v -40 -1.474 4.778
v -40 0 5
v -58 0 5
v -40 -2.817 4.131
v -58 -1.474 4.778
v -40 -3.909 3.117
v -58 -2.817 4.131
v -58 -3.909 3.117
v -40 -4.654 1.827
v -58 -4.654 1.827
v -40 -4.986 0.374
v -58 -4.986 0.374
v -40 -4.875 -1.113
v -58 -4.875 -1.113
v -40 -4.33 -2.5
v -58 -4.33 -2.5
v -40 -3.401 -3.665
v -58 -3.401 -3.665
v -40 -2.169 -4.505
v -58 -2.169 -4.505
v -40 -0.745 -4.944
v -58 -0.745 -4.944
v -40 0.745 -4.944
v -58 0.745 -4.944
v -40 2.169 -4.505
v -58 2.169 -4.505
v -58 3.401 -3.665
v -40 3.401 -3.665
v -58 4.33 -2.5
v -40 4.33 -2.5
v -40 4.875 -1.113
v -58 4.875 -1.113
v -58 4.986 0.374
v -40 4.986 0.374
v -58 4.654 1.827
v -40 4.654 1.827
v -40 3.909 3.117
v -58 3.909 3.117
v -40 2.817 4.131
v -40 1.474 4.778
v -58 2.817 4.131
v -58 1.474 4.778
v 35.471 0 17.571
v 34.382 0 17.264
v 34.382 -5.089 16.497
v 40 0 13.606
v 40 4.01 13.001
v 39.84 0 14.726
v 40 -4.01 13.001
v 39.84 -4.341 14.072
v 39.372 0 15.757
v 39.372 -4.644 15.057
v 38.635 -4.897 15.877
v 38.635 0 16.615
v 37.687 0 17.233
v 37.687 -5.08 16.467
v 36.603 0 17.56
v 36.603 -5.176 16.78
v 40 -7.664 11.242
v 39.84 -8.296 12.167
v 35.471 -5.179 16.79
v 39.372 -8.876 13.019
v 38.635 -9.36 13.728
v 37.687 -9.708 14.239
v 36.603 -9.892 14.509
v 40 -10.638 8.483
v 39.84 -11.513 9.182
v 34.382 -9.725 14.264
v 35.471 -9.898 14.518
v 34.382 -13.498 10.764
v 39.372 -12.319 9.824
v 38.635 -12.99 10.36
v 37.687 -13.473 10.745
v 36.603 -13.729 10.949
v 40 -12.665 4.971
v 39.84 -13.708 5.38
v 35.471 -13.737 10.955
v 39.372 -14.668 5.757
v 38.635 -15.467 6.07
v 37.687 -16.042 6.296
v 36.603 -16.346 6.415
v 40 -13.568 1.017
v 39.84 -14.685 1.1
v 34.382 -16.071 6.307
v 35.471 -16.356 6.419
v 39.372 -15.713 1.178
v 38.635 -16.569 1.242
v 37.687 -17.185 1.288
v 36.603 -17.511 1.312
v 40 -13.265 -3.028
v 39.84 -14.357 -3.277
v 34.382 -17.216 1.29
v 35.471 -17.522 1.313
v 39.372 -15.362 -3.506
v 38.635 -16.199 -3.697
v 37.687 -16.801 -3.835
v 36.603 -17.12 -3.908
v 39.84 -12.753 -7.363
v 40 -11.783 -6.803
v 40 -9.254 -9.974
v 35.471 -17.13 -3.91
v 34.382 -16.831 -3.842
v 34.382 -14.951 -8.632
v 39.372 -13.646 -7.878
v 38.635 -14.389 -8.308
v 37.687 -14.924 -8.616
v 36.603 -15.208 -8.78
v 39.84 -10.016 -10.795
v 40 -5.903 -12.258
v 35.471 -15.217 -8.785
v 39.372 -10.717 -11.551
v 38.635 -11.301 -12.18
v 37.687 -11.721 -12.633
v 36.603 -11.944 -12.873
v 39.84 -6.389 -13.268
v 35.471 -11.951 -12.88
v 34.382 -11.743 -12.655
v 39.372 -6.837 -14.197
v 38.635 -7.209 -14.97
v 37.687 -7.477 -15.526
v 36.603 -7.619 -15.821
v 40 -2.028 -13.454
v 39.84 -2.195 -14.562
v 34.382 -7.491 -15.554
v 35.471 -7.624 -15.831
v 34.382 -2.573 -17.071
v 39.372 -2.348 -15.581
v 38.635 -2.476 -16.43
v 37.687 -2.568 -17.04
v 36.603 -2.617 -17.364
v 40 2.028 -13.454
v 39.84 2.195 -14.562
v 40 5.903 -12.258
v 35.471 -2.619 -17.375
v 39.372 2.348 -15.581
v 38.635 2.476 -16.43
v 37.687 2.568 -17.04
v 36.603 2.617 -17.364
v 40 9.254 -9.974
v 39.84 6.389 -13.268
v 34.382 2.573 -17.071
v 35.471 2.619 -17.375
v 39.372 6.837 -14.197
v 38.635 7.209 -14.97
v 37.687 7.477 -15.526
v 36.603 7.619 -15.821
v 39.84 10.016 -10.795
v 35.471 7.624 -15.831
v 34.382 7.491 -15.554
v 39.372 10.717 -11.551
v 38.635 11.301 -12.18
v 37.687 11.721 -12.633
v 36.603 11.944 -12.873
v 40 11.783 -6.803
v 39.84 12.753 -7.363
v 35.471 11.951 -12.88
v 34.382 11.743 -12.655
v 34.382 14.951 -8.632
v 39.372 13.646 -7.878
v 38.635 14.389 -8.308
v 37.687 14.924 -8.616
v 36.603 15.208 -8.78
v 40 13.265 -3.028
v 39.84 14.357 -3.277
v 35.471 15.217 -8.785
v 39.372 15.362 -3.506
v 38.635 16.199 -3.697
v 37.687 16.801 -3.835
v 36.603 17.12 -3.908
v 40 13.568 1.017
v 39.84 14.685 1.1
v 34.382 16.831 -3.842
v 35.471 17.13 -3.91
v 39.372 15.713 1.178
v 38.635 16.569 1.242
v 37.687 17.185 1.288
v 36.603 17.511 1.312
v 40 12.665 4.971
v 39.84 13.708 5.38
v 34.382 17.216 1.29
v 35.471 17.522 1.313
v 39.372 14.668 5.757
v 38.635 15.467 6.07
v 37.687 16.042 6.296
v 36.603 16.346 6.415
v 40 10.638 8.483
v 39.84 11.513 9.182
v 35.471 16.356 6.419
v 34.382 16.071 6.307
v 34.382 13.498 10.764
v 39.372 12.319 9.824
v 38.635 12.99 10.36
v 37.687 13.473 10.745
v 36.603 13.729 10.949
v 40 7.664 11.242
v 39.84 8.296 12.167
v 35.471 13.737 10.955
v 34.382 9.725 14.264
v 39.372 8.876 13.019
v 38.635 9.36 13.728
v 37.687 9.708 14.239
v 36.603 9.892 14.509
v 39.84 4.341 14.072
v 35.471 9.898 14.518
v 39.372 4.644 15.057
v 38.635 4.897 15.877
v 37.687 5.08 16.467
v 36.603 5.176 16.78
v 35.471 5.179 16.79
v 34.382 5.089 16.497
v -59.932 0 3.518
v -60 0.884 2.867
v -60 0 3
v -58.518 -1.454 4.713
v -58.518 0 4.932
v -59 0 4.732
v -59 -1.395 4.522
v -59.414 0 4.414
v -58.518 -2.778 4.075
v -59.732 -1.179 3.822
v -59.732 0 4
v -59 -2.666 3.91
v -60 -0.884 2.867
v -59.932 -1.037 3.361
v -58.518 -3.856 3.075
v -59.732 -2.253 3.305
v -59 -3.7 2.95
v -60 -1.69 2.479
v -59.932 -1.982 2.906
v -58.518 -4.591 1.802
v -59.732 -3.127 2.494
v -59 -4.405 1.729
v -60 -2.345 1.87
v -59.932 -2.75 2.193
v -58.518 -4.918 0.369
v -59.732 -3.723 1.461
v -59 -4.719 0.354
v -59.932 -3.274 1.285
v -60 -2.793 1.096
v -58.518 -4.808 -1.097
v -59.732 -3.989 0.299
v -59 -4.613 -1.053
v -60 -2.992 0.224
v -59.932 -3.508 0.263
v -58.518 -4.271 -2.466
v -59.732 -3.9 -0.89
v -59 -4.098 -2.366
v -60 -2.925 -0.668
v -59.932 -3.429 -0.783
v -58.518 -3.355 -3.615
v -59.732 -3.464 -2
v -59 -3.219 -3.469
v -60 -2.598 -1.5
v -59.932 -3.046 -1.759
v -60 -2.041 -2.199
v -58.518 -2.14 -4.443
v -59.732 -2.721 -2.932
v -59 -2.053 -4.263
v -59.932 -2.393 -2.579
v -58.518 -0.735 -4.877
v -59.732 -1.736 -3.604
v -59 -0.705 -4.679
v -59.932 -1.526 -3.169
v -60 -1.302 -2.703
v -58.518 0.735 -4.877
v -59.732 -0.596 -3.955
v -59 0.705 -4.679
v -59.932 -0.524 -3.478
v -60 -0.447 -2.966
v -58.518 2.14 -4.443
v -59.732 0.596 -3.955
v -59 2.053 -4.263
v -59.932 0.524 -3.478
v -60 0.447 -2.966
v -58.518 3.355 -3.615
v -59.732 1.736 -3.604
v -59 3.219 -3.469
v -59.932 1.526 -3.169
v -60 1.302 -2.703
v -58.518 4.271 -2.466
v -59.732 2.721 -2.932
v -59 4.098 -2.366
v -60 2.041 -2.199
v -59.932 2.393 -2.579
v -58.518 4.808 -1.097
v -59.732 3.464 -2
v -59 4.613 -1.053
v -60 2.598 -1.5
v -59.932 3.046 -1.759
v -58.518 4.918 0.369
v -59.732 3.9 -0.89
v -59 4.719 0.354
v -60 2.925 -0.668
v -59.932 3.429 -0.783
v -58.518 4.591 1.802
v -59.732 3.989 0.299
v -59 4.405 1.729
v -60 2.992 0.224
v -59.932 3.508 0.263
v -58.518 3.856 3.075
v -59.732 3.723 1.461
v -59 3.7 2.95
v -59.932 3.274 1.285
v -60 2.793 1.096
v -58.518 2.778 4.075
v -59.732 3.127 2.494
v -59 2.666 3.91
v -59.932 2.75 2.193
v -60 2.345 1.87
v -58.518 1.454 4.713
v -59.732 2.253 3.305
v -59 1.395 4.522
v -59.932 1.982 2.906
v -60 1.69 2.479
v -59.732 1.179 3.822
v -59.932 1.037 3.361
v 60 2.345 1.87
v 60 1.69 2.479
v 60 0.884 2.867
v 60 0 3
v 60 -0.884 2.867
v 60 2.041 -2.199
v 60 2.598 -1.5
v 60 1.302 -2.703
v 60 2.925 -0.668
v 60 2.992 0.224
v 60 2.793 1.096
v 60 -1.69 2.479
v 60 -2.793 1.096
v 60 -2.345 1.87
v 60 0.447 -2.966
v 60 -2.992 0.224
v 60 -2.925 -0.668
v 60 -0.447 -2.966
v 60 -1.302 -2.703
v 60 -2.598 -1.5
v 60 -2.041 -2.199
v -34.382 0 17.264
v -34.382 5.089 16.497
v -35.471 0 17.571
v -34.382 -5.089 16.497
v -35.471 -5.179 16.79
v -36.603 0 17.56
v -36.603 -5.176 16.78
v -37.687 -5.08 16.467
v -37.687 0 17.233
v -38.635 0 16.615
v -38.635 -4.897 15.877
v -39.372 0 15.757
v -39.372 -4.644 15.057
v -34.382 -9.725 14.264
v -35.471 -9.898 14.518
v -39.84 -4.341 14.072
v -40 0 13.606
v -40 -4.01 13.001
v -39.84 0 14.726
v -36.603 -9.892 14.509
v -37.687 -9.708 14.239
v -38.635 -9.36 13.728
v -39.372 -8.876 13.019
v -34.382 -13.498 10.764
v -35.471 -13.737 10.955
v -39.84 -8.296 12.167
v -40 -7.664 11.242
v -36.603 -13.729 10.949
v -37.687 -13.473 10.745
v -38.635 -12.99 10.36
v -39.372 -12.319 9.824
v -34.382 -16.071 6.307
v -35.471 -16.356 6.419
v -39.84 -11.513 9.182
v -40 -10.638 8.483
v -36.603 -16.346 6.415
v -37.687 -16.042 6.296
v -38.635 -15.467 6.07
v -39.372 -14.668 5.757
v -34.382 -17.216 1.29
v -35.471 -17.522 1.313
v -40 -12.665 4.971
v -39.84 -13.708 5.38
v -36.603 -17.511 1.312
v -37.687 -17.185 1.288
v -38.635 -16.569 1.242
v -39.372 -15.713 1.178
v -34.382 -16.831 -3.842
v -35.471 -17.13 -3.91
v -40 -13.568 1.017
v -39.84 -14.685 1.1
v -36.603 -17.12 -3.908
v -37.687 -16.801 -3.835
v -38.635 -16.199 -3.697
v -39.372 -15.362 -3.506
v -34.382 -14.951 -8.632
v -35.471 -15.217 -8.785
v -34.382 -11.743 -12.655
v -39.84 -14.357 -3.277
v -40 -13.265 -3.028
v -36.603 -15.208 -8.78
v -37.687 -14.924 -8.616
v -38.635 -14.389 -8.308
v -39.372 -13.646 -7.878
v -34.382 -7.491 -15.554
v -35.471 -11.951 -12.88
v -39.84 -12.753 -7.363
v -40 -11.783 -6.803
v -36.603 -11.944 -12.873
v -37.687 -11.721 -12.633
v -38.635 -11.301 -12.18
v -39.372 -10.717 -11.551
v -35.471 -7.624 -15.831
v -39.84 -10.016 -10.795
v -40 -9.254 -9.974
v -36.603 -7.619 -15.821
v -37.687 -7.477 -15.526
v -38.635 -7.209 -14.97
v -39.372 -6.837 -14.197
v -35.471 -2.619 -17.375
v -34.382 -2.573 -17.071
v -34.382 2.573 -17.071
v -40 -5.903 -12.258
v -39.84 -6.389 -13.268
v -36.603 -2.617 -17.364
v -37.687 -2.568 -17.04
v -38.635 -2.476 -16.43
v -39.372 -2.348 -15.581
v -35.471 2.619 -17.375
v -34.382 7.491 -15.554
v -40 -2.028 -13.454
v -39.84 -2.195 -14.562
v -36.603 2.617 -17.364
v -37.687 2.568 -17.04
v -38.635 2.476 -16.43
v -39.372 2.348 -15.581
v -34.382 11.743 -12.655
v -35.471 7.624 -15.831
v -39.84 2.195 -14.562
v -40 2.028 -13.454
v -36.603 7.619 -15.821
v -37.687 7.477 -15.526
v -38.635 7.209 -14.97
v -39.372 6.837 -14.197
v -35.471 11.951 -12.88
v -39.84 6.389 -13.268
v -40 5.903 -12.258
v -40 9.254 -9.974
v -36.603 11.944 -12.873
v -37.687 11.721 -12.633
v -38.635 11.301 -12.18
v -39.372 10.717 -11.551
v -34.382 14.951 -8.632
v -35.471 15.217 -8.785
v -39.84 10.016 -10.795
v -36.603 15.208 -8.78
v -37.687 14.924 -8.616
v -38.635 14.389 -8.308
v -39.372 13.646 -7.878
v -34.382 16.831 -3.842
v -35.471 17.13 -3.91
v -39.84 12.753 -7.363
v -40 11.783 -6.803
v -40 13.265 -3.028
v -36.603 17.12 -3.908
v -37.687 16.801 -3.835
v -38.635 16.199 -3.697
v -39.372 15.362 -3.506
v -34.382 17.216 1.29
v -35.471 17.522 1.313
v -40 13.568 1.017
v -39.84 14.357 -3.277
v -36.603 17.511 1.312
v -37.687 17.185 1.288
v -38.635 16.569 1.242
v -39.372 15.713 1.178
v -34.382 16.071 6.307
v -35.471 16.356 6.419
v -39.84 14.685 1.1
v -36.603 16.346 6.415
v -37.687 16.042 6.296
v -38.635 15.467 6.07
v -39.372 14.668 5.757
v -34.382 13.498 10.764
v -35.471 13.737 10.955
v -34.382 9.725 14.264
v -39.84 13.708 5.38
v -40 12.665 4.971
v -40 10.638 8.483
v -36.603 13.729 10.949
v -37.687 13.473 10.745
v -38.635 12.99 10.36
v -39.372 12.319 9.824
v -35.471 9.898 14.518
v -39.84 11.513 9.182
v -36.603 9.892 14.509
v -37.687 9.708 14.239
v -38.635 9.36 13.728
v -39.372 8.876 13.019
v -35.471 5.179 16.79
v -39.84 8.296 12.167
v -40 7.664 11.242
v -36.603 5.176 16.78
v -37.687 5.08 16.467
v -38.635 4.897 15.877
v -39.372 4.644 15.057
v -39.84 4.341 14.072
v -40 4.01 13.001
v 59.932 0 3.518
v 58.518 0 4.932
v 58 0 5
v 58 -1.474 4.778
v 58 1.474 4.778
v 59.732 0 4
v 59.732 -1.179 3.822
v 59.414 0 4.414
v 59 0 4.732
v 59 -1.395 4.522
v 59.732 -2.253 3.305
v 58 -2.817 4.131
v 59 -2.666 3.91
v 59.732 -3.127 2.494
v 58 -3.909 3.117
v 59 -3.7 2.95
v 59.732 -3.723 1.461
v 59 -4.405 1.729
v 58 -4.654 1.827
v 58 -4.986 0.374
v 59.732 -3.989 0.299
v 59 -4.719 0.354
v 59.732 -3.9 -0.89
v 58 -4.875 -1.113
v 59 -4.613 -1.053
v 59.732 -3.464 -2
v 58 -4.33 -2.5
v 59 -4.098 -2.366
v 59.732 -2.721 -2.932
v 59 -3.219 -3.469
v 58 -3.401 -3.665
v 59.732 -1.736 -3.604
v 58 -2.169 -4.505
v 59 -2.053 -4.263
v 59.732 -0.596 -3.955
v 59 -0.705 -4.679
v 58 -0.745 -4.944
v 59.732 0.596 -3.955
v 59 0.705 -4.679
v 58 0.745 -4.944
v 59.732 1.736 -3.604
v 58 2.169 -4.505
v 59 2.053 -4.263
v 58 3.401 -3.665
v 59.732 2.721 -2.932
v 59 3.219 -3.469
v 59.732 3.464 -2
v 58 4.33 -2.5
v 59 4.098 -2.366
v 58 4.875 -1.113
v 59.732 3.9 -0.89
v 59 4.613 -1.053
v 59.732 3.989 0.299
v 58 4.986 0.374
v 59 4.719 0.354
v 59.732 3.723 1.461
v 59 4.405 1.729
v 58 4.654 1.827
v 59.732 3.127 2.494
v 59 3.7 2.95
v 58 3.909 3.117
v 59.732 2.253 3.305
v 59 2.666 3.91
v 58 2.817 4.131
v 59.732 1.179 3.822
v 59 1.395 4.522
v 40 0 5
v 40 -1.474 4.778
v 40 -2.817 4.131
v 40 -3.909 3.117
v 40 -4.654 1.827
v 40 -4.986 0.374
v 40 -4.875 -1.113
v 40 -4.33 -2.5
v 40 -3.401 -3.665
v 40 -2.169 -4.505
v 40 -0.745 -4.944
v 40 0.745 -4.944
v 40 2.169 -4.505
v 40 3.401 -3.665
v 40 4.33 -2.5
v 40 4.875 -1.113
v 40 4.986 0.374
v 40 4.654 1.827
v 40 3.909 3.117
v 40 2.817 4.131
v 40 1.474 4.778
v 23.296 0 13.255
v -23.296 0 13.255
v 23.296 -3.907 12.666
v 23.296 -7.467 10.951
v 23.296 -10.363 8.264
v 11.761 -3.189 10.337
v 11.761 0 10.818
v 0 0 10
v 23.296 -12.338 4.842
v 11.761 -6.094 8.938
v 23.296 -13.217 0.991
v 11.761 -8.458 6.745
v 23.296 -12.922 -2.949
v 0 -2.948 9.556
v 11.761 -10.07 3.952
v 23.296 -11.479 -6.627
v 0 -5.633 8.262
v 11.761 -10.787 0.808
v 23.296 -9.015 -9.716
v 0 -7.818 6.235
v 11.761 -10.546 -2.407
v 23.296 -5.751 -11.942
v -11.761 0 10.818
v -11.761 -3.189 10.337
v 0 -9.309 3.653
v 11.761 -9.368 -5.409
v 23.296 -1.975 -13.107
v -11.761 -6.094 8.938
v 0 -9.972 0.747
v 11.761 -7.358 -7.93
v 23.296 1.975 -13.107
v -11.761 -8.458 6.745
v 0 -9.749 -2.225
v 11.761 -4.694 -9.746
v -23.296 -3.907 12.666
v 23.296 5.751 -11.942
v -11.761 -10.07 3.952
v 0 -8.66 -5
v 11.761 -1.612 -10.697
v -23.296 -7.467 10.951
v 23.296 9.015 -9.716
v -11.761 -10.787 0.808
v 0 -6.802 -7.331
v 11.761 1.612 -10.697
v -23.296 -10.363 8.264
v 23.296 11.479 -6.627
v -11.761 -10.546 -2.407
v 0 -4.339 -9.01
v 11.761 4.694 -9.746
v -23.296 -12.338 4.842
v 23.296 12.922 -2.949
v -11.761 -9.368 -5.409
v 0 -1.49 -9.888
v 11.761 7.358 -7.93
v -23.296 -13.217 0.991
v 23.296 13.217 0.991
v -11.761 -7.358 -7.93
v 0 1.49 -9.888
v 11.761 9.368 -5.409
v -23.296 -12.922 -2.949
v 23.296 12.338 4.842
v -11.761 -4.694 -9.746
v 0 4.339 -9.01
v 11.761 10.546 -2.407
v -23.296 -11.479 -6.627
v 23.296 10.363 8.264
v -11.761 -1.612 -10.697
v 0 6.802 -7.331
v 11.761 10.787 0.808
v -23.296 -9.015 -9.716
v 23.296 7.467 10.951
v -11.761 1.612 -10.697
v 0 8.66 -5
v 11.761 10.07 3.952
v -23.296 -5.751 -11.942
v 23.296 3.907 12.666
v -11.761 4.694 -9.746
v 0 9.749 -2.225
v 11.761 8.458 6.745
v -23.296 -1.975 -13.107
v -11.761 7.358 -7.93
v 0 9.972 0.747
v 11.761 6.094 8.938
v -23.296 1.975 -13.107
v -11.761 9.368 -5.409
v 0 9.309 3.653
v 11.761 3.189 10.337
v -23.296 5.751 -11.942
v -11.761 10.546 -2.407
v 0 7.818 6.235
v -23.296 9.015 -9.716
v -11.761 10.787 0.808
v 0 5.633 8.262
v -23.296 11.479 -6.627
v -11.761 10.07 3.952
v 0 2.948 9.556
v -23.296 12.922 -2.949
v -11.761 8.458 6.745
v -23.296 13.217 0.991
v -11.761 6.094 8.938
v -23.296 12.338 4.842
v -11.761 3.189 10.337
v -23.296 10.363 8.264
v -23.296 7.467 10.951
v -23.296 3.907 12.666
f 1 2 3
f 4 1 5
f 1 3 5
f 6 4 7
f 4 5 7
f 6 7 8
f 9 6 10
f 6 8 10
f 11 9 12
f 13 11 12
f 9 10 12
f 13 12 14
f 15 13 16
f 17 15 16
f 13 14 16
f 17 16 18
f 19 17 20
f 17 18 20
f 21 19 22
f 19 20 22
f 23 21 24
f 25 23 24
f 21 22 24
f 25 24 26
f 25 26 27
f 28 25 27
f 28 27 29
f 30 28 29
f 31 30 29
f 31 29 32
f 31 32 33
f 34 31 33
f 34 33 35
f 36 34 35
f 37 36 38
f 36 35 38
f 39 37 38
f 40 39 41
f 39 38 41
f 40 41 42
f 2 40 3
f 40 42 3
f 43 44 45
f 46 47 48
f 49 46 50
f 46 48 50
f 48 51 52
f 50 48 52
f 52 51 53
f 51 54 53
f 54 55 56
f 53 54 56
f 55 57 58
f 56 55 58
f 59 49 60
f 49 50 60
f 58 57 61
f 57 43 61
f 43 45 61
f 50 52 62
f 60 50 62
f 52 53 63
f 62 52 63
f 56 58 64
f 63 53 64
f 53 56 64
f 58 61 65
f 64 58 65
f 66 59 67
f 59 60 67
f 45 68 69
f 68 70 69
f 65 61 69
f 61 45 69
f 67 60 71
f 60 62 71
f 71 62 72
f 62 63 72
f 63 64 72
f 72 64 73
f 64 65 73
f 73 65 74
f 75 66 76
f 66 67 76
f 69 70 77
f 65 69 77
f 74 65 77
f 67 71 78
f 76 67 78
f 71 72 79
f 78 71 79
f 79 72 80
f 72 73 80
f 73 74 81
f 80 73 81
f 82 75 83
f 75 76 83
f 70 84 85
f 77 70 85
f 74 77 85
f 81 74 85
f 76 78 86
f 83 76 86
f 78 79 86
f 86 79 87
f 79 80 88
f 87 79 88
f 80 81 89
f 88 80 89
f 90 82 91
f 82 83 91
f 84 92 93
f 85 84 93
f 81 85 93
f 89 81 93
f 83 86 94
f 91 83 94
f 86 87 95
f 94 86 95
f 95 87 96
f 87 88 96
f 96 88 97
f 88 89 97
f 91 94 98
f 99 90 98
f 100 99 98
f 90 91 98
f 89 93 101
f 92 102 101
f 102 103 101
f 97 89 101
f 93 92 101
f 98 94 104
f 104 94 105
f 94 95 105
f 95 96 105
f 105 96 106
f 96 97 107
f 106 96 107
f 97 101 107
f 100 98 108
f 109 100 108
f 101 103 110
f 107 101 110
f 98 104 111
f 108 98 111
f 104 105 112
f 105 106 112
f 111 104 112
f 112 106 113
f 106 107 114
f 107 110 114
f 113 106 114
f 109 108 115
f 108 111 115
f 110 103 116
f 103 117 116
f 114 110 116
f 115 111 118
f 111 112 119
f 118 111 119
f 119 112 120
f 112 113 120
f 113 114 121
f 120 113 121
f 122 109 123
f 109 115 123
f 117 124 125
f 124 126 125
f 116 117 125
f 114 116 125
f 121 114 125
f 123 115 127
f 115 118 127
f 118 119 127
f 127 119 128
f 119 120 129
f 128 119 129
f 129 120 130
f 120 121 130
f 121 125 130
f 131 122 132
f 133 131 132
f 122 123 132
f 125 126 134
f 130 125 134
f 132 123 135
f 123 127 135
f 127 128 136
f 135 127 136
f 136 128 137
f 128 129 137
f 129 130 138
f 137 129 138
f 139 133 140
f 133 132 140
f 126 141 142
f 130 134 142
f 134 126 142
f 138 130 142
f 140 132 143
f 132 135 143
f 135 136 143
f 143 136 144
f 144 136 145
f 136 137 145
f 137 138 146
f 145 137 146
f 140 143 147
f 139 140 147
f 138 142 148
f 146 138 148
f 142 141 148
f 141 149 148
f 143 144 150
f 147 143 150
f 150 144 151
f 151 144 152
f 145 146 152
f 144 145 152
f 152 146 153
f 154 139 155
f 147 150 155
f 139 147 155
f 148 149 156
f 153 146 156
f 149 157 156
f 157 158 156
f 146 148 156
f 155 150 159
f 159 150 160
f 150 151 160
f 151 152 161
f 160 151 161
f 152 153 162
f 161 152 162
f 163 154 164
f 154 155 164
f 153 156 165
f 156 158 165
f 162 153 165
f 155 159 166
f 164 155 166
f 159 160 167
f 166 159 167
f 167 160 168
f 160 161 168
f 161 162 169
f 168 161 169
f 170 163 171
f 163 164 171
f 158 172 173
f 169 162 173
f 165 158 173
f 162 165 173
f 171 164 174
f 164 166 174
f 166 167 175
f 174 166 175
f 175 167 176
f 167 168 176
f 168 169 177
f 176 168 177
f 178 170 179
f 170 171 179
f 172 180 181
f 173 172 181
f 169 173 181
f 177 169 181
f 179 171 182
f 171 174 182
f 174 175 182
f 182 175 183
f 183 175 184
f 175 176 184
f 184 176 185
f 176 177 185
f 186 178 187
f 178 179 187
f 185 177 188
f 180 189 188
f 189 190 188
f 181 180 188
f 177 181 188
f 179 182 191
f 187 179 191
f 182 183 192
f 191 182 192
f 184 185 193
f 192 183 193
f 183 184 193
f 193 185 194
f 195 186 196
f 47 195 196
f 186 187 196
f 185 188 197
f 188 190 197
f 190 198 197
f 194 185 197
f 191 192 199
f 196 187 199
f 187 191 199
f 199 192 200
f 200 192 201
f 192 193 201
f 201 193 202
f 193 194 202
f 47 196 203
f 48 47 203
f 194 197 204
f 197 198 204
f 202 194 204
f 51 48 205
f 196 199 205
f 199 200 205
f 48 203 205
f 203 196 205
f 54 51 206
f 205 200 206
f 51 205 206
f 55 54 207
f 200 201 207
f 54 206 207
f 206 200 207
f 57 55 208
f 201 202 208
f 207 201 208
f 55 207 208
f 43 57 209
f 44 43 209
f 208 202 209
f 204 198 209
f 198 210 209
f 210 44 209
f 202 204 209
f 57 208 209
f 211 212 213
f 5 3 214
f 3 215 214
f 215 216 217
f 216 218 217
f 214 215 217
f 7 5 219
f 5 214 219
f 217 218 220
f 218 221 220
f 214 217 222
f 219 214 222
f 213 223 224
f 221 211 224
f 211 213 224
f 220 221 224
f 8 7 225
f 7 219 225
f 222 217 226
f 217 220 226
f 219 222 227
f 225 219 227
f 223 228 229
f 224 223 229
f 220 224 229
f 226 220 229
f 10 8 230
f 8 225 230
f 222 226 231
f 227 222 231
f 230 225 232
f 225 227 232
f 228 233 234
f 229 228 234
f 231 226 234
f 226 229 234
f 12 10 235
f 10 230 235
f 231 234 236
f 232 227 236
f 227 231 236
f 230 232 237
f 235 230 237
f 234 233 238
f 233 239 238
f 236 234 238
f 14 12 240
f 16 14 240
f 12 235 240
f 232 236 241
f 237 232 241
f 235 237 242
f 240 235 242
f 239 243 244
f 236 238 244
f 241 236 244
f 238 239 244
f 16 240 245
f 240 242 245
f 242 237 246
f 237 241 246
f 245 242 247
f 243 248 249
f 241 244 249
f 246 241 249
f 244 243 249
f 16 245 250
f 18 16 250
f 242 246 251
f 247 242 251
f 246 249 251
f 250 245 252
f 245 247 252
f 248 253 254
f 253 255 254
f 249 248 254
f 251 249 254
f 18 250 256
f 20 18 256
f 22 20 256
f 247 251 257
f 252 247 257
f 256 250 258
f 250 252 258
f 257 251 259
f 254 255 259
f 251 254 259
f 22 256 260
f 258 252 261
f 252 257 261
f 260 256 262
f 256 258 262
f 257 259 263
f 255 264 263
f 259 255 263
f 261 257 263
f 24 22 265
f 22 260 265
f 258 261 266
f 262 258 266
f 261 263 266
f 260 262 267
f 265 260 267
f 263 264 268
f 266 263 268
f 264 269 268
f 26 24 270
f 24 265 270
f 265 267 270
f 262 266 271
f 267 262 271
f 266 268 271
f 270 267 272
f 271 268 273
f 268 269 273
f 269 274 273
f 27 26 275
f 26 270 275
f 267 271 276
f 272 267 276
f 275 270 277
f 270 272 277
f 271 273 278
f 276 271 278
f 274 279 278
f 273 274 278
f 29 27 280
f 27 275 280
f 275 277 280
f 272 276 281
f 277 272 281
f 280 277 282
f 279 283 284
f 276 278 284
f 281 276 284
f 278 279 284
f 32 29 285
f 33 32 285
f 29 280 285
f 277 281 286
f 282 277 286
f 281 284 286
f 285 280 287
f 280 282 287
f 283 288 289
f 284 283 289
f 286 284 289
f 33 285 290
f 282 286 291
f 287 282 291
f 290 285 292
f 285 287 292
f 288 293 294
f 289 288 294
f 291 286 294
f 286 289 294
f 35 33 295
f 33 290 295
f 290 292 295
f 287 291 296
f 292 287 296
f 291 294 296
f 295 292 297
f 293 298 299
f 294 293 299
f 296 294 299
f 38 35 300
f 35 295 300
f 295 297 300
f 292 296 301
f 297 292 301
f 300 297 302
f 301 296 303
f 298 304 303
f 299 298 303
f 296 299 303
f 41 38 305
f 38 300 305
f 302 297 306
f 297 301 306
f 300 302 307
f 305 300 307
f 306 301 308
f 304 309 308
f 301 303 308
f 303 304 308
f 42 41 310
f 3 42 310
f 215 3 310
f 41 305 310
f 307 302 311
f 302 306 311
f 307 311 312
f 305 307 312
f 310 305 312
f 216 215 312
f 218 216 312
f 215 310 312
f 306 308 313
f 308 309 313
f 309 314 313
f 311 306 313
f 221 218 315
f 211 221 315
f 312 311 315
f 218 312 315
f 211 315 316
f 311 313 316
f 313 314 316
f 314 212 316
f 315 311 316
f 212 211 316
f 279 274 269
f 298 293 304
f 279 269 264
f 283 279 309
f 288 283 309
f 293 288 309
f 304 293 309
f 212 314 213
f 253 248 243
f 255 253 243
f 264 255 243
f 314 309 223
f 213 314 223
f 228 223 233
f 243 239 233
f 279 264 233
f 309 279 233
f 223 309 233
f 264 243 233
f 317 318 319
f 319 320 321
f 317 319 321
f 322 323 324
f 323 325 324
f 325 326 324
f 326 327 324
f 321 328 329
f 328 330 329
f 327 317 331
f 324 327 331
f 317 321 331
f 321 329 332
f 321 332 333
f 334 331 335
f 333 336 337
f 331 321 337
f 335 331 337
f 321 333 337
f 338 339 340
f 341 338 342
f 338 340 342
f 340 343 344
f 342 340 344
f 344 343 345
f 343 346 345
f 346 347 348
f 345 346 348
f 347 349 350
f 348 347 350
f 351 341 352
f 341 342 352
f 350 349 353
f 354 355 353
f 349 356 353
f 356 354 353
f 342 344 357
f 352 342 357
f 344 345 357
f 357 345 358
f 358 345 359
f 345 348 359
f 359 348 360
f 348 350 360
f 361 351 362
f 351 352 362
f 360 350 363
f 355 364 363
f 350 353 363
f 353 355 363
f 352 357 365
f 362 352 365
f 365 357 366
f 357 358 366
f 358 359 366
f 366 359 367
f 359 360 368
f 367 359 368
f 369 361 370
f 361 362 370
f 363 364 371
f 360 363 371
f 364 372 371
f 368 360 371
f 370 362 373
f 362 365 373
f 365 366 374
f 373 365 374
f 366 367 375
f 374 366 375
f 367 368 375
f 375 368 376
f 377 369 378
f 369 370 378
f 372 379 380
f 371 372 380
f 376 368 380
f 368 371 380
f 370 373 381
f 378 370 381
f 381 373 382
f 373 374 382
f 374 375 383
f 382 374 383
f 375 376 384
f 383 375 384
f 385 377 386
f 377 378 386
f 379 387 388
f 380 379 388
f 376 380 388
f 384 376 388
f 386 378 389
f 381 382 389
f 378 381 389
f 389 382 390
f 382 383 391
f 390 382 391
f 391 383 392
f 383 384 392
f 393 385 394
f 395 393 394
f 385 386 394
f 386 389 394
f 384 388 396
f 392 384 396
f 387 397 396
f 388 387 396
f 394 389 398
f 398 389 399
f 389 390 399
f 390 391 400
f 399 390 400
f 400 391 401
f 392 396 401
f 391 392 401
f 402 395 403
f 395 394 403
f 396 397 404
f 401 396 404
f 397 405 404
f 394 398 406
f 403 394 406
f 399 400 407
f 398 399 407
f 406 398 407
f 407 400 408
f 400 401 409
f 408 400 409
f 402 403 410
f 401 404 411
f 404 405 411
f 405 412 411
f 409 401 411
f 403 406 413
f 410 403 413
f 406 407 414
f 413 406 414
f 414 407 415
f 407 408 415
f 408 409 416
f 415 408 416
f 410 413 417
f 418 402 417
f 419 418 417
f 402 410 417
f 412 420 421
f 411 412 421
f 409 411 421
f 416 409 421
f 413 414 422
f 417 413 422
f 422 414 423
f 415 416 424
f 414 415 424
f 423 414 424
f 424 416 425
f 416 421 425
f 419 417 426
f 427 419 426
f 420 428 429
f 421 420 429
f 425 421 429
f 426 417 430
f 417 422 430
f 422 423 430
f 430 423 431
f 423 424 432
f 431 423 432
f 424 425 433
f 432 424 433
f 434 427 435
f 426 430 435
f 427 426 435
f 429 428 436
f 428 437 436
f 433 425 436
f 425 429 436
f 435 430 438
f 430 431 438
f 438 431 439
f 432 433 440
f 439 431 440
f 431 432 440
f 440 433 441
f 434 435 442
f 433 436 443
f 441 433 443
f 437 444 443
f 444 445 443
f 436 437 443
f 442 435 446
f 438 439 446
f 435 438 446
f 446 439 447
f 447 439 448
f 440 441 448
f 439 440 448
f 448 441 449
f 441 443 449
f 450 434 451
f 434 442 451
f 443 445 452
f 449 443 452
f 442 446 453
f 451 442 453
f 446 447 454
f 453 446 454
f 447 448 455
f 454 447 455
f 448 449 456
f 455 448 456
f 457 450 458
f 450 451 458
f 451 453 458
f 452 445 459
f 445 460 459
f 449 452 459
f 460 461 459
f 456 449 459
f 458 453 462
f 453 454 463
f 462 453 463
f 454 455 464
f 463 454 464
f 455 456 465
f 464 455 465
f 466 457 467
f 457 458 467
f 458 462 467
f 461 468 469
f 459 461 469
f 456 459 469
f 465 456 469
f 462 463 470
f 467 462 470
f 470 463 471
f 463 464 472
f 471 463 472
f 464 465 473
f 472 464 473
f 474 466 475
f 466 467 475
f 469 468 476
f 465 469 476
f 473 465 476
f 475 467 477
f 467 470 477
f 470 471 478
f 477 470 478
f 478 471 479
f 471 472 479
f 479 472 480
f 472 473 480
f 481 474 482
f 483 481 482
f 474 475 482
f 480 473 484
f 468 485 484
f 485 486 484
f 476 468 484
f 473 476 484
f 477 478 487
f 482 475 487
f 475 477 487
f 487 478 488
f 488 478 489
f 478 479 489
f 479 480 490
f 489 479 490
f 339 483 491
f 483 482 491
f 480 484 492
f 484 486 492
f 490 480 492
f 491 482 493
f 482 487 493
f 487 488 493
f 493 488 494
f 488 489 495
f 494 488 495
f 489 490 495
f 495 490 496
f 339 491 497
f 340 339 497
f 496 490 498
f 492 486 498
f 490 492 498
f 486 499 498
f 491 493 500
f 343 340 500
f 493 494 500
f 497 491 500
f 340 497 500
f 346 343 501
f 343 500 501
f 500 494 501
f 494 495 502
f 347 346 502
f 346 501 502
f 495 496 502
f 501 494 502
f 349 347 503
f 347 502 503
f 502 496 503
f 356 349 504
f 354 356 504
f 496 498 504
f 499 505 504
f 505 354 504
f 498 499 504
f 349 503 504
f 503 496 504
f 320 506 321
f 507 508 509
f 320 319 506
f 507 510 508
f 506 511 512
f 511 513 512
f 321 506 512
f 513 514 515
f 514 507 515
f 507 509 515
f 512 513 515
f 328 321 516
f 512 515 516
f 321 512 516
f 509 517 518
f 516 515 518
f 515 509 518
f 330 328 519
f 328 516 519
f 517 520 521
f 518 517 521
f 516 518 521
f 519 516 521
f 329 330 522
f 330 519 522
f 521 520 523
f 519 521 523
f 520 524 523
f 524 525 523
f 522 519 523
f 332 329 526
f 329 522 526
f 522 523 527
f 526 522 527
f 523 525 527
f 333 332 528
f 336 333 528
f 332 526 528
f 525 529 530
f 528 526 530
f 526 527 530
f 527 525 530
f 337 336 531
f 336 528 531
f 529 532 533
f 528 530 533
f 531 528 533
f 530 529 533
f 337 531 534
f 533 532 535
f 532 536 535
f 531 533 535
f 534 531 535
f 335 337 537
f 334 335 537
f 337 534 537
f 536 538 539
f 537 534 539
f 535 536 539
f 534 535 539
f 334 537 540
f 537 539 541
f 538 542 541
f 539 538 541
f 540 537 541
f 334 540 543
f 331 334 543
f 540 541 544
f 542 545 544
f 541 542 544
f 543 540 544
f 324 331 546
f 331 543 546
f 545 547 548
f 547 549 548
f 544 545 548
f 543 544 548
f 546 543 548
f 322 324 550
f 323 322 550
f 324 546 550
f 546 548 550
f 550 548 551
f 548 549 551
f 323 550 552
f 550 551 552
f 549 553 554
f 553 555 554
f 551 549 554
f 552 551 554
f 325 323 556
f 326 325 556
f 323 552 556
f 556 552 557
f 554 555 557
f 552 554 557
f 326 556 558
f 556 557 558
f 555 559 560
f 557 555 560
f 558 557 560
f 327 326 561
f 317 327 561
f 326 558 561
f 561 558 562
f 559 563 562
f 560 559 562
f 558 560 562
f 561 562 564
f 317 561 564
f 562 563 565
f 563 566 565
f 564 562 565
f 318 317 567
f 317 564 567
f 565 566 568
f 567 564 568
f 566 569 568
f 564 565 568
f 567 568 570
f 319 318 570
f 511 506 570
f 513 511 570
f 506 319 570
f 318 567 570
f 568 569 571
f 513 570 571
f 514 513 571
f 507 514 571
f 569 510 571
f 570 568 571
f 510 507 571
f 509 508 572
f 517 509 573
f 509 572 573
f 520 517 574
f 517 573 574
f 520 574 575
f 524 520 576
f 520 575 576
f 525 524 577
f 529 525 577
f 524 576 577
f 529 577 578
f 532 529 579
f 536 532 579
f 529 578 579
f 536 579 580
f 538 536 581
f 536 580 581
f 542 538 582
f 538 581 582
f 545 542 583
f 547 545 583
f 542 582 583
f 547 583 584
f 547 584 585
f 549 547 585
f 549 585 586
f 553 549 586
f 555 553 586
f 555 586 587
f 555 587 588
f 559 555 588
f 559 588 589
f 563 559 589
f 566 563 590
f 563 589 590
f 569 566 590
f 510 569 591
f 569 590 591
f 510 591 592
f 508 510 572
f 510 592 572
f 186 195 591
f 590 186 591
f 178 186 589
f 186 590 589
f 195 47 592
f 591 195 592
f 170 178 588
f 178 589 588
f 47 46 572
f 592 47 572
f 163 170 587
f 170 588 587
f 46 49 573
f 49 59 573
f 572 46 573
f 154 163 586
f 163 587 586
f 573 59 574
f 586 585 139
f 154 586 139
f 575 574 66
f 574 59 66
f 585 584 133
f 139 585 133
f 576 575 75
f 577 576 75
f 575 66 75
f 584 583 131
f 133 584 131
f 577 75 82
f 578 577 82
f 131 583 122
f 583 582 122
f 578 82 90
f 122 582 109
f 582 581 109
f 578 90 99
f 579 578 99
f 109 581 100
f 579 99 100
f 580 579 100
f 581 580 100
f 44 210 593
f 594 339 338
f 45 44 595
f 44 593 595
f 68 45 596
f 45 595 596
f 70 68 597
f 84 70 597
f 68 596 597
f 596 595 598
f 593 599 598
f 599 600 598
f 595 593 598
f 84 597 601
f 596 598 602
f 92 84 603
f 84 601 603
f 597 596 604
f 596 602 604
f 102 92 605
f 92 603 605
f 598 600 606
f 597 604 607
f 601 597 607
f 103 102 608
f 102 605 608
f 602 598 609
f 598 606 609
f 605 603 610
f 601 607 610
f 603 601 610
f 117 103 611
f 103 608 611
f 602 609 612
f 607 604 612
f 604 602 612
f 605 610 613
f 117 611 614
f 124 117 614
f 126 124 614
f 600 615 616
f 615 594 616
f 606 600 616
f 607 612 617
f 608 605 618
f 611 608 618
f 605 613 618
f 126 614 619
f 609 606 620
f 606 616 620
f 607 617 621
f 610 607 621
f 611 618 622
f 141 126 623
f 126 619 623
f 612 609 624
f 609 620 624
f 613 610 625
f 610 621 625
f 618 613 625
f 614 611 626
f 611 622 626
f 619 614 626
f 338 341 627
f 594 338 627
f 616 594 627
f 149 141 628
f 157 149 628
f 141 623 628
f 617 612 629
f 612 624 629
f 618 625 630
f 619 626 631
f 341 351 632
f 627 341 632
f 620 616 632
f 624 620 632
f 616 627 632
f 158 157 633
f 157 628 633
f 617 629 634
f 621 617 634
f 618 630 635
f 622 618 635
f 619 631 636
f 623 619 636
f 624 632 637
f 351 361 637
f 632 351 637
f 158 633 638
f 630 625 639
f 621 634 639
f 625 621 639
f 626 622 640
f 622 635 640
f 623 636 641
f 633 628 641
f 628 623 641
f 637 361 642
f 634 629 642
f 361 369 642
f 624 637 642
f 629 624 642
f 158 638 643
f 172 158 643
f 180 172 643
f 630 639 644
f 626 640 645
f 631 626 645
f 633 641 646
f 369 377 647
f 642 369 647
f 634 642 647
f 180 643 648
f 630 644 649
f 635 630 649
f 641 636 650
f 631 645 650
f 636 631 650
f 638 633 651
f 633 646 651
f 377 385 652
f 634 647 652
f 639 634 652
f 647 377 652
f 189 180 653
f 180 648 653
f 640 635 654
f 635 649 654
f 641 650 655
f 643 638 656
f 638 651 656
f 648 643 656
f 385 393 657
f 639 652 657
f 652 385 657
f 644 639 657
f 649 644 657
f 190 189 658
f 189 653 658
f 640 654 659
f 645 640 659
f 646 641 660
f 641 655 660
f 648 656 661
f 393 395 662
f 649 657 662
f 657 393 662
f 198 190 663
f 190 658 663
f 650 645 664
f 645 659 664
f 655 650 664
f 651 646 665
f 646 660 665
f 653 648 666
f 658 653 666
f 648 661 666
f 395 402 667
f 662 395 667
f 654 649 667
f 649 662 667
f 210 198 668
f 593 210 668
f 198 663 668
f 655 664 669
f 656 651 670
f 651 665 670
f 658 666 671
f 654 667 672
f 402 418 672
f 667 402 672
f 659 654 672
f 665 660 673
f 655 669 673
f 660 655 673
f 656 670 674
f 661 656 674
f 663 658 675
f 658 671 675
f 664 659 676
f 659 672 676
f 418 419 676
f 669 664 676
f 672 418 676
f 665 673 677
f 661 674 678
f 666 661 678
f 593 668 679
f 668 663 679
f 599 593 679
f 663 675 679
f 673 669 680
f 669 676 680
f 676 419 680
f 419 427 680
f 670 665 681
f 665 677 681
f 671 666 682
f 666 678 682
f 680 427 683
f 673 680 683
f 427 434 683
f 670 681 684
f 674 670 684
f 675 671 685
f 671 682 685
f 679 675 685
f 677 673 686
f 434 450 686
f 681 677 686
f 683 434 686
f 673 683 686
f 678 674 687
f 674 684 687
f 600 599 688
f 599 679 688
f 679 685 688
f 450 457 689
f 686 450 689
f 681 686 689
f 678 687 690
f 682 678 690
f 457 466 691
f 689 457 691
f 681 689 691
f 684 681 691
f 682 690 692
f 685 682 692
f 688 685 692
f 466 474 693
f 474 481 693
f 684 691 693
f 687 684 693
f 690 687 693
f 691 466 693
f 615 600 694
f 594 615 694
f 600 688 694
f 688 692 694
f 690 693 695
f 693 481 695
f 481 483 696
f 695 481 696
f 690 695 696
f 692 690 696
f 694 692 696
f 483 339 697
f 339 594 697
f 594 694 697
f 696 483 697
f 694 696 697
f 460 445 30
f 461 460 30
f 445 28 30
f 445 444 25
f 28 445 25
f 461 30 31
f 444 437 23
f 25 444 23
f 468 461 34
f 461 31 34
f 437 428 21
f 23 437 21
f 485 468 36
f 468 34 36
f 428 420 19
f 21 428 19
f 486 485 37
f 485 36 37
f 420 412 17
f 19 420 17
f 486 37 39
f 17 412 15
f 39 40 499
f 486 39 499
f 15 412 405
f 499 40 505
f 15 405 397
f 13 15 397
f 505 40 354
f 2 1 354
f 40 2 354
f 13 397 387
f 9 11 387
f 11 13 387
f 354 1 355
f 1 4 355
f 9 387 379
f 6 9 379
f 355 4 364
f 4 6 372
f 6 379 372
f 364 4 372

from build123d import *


with BuildPart() as part:
    # Sketch3 → Revolve1 (revolve)
    with BuildSketch(Plane.XY, mode=Mode.PRIVATE) as revolve1_sk:
        with BuildLine():
            Line((-60, 0), (60, 0))
            Line((60, 0), (60, -3))
            ThreePointArc((60, -3), (59.414213562, -4.414213562), (58, -5))
            Line((58, -5), (40, -5))
            Line((40, -5), (40, -13.60589702))
            ThreePointArc((40, -13.60589702), (38.182669225, -16.957904635), (34.382022472, -17.264058951))
            ThreePointArc((34.382022472, -17.264058951), (0, -10), (-34.382022472, -17.264058951))
            ThreePointArc((-34.382022472, -17.264058951), (-38.182669225, -16.957904635), (-40, -13.60589702))
            Line((-40, -13.60589702), (-40, -5))
            Line((-40, -5), (-58, -5))
            ThreePointArc((-58, -5), (-59.414213562, -4.414213562), (-60, -3))
            Line((-60, -3), (-60, 0))
        make_face()
    revolve(revolve1_sk.sketch.rotate(Axis((-60, 0, 0), (1, 0, 0)), 270), axis=Axis((-60, 0, 0), (1, 0, 0)))


solid = part.part
